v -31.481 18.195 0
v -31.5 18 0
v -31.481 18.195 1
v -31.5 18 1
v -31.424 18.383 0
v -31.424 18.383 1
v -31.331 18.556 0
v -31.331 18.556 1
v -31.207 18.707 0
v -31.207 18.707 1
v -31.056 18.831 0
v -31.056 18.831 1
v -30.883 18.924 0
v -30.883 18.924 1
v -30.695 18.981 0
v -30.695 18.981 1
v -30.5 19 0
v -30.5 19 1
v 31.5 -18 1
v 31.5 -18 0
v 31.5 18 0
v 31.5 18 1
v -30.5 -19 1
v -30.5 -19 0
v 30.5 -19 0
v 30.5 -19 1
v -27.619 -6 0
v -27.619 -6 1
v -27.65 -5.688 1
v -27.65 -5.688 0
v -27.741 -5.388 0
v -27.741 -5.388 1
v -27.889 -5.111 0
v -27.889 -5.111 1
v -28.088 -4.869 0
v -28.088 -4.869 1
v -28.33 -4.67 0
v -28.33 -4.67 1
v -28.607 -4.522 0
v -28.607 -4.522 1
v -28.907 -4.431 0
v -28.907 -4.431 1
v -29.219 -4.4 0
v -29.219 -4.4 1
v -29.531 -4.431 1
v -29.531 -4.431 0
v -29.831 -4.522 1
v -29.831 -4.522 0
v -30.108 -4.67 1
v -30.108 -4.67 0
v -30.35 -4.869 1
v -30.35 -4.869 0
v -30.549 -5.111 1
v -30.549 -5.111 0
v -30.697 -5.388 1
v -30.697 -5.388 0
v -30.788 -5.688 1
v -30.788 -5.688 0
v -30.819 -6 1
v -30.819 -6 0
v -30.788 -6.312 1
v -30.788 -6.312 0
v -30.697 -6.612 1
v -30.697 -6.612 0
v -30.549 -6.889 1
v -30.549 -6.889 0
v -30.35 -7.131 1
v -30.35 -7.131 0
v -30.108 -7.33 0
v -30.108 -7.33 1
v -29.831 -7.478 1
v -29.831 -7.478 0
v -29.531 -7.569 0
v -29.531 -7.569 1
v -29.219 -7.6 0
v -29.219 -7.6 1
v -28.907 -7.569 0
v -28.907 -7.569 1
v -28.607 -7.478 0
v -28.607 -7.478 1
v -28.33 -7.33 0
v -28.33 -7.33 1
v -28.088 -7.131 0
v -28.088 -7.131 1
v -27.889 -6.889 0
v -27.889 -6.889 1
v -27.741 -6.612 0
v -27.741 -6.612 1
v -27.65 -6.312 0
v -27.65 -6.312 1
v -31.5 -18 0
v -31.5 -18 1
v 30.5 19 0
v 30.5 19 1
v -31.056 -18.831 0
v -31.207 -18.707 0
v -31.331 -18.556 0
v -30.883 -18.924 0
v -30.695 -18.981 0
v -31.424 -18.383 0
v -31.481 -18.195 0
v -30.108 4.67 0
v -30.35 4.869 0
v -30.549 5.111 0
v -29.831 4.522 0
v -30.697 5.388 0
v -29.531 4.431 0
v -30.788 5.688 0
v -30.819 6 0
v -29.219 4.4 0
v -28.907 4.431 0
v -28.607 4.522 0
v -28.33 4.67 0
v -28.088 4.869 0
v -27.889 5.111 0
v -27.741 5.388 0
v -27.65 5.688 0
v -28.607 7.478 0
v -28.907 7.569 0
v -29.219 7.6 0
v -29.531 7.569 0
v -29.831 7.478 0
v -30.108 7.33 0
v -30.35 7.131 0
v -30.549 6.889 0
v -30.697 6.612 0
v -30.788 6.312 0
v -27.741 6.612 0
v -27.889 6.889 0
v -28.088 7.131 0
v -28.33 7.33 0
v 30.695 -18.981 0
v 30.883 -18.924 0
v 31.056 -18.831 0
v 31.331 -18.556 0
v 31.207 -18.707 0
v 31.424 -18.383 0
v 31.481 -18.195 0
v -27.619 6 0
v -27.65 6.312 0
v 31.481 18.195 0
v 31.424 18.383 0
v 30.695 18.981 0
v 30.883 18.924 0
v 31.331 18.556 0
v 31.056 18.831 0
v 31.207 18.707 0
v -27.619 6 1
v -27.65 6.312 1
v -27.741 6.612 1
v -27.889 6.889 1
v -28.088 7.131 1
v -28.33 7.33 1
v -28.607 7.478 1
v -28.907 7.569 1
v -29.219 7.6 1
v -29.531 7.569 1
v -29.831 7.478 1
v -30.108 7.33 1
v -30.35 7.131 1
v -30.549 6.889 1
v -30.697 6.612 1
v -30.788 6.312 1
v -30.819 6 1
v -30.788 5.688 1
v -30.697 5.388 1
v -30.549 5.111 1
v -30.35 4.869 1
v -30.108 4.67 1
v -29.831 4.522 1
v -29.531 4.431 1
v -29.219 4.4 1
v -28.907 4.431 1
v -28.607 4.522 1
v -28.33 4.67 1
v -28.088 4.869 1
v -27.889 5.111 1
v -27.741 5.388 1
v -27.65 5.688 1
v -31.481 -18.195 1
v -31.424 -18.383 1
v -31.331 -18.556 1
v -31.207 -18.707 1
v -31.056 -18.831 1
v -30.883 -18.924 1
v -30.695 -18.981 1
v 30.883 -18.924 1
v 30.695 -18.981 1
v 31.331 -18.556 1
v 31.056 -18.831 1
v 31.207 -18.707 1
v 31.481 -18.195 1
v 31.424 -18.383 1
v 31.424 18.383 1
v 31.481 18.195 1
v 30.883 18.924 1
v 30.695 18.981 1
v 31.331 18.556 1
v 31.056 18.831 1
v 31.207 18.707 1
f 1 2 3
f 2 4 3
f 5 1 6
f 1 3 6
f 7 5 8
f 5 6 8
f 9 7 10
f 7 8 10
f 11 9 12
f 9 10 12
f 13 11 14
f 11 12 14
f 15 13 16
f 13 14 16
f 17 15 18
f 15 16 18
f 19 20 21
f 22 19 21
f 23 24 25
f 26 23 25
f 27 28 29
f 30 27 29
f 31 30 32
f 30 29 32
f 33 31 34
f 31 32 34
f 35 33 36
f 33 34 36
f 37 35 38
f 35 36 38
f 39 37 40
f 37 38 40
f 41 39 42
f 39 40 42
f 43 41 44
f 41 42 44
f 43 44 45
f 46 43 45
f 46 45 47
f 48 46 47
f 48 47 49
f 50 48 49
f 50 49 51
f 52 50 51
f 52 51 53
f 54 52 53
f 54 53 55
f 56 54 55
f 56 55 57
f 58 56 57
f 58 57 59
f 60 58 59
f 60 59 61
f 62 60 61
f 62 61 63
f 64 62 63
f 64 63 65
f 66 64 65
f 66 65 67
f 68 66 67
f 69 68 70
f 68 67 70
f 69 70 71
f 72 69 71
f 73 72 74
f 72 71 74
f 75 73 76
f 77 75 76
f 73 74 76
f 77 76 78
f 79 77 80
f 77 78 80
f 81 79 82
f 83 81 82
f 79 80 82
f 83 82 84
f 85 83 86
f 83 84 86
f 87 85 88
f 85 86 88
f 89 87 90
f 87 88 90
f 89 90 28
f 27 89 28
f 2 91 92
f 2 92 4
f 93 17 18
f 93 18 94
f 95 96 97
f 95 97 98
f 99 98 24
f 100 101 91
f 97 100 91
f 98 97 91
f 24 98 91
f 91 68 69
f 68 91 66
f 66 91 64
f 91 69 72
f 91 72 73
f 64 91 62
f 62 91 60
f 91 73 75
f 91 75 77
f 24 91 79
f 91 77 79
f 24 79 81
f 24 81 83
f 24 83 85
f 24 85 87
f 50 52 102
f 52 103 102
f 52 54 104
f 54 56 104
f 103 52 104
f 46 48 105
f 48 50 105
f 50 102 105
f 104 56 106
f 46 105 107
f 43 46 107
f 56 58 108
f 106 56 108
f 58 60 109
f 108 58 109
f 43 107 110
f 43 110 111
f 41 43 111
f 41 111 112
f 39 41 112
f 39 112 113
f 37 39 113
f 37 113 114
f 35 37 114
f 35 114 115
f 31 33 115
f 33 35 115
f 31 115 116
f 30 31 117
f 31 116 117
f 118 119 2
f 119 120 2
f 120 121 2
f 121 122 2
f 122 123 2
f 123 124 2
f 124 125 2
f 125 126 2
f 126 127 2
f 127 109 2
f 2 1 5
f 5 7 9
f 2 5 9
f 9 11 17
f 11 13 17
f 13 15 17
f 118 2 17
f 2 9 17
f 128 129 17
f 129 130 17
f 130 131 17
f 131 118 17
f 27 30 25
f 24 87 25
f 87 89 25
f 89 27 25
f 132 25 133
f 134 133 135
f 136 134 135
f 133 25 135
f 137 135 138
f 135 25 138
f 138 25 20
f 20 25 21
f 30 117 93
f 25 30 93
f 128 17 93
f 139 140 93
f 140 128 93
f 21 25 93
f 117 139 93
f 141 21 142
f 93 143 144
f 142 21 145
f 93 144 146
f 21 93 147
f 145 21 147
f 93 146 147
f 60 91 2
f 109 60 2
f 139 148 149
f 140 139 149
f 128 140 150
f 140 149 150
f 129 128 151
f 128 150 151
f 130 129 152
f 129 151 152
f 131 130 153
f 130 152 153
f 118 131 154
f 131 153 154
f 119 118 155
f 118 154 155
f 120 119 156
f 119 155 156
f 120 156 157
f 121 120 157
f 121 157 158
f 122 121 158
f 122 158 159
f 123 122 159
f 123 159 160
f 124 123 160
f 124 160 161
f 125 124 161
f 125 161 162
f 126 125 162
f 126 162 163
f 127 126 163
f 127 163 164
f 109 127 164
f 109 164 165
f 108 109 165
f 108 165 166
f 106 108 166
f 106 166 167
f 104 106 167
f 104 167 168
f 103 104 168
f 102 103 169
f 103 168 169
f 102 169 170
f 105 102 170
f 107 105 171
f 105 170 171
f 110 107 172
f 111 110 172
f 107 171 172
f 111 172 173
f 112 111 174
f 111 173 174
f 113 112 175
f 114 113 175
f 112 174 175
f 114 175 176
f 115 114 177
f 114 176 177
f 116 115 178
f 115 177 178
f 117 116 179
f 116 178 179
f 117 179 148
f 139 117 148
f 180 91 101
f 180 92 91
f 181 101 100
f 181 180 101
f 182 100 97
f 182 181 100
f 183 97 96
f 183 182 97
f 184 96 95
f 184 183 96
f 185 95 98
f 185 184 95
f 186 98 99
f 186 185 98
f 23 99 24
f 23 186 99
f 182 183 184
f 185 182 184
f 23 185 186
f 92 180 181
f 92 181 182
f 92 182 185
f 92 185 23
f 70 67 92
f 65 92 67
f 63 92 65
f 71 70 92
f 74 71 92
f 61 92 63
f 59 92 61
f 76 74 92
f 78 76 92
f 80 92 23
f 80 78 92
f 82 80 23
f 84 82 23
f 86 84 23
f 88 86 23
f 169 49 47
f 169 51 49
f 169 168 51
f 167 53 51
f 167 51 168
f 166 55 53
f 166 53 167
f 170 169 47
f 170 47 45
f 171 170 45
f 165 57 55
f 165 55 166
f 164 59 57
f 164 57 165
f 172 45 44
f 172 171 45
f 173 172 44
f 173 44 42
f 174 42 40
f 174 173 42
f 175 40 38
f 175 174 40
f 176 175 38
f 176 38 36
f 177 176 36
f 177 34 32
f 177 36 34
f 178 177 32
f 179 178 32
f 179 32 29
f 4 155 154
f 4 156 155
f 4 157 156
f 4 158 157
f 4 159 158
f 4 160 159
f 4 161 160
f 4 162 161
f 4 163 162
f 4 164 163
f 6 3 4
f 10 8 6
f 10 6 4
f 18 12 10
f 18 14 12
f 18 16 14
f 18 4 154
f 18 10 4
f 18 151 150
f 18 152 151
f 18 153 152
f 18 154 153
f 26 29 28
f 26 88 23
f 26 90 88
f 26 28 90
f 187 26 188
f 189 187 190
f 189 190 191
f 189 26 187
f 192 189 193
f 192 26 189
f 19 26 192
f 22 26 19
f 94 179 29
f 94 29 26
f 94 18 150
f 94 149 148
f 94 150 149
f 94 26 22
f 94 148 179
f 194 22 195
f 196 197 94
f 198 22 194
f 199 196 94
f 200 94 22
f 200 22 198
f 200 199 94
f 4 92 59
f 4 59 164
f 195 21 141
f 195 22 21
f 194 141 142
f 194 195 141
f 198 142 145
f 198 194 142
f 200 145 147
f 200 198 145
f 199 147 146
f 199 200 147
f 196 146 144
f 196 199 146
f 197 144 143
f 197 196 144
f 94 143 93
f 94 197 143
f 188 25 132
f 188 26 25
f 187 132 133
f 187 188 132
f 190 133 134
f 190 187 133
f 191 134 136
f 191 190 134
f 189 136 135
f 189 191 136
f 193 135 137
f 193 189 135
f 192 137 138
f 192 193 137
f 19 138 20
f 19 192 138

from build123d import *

# Parameters (mm, degrees)
SKETCH_1_W          = 63
SKETCH_1_H          = 38
EXTRUDE_1_DEPTH     = 1
FILLET_1_R          = 1
SKETCH_2_R          = 1.6
CUT_EXTRUDE_1_DEPTH = 2


with BuildPart() as part:
    # 草图1 → 凸台-拉伸1 (new body)
    with BuildSketch(Plane.XY):
        Rectangle(SKETCH_1_W, SKETCH_1_H)
    extrude(amount=EXTRUDE_1_DEPTH)

    # 圆角1
    fillet_1_edges = [part.edges().sort_by_distance(p)[0] for p in [
        (31.5, -19, 0.5),
        (-31.5, -19, 0.5),
        (-31.5, 19, 0.5),
        (31.5, 19, 0.5),
    ]]
    fillet(fillet_1_edges, radius=FILLET_1_R)

    # 草图2 → 切除-拉伸1 (cut)
    with BuildSketch(Plane.XY.offset(1)):
        with Locations((-29.218874675, -6)):
            Circle(SKETCH_2_R)
        with Locations((-29.218874675, 6)):
            Circle(SKETCH_2_R)
    extrude(amount=-CUT_EXTRUDE_1_DEPTH, mode=Mode.SUBTRACT)


solid = part.part
